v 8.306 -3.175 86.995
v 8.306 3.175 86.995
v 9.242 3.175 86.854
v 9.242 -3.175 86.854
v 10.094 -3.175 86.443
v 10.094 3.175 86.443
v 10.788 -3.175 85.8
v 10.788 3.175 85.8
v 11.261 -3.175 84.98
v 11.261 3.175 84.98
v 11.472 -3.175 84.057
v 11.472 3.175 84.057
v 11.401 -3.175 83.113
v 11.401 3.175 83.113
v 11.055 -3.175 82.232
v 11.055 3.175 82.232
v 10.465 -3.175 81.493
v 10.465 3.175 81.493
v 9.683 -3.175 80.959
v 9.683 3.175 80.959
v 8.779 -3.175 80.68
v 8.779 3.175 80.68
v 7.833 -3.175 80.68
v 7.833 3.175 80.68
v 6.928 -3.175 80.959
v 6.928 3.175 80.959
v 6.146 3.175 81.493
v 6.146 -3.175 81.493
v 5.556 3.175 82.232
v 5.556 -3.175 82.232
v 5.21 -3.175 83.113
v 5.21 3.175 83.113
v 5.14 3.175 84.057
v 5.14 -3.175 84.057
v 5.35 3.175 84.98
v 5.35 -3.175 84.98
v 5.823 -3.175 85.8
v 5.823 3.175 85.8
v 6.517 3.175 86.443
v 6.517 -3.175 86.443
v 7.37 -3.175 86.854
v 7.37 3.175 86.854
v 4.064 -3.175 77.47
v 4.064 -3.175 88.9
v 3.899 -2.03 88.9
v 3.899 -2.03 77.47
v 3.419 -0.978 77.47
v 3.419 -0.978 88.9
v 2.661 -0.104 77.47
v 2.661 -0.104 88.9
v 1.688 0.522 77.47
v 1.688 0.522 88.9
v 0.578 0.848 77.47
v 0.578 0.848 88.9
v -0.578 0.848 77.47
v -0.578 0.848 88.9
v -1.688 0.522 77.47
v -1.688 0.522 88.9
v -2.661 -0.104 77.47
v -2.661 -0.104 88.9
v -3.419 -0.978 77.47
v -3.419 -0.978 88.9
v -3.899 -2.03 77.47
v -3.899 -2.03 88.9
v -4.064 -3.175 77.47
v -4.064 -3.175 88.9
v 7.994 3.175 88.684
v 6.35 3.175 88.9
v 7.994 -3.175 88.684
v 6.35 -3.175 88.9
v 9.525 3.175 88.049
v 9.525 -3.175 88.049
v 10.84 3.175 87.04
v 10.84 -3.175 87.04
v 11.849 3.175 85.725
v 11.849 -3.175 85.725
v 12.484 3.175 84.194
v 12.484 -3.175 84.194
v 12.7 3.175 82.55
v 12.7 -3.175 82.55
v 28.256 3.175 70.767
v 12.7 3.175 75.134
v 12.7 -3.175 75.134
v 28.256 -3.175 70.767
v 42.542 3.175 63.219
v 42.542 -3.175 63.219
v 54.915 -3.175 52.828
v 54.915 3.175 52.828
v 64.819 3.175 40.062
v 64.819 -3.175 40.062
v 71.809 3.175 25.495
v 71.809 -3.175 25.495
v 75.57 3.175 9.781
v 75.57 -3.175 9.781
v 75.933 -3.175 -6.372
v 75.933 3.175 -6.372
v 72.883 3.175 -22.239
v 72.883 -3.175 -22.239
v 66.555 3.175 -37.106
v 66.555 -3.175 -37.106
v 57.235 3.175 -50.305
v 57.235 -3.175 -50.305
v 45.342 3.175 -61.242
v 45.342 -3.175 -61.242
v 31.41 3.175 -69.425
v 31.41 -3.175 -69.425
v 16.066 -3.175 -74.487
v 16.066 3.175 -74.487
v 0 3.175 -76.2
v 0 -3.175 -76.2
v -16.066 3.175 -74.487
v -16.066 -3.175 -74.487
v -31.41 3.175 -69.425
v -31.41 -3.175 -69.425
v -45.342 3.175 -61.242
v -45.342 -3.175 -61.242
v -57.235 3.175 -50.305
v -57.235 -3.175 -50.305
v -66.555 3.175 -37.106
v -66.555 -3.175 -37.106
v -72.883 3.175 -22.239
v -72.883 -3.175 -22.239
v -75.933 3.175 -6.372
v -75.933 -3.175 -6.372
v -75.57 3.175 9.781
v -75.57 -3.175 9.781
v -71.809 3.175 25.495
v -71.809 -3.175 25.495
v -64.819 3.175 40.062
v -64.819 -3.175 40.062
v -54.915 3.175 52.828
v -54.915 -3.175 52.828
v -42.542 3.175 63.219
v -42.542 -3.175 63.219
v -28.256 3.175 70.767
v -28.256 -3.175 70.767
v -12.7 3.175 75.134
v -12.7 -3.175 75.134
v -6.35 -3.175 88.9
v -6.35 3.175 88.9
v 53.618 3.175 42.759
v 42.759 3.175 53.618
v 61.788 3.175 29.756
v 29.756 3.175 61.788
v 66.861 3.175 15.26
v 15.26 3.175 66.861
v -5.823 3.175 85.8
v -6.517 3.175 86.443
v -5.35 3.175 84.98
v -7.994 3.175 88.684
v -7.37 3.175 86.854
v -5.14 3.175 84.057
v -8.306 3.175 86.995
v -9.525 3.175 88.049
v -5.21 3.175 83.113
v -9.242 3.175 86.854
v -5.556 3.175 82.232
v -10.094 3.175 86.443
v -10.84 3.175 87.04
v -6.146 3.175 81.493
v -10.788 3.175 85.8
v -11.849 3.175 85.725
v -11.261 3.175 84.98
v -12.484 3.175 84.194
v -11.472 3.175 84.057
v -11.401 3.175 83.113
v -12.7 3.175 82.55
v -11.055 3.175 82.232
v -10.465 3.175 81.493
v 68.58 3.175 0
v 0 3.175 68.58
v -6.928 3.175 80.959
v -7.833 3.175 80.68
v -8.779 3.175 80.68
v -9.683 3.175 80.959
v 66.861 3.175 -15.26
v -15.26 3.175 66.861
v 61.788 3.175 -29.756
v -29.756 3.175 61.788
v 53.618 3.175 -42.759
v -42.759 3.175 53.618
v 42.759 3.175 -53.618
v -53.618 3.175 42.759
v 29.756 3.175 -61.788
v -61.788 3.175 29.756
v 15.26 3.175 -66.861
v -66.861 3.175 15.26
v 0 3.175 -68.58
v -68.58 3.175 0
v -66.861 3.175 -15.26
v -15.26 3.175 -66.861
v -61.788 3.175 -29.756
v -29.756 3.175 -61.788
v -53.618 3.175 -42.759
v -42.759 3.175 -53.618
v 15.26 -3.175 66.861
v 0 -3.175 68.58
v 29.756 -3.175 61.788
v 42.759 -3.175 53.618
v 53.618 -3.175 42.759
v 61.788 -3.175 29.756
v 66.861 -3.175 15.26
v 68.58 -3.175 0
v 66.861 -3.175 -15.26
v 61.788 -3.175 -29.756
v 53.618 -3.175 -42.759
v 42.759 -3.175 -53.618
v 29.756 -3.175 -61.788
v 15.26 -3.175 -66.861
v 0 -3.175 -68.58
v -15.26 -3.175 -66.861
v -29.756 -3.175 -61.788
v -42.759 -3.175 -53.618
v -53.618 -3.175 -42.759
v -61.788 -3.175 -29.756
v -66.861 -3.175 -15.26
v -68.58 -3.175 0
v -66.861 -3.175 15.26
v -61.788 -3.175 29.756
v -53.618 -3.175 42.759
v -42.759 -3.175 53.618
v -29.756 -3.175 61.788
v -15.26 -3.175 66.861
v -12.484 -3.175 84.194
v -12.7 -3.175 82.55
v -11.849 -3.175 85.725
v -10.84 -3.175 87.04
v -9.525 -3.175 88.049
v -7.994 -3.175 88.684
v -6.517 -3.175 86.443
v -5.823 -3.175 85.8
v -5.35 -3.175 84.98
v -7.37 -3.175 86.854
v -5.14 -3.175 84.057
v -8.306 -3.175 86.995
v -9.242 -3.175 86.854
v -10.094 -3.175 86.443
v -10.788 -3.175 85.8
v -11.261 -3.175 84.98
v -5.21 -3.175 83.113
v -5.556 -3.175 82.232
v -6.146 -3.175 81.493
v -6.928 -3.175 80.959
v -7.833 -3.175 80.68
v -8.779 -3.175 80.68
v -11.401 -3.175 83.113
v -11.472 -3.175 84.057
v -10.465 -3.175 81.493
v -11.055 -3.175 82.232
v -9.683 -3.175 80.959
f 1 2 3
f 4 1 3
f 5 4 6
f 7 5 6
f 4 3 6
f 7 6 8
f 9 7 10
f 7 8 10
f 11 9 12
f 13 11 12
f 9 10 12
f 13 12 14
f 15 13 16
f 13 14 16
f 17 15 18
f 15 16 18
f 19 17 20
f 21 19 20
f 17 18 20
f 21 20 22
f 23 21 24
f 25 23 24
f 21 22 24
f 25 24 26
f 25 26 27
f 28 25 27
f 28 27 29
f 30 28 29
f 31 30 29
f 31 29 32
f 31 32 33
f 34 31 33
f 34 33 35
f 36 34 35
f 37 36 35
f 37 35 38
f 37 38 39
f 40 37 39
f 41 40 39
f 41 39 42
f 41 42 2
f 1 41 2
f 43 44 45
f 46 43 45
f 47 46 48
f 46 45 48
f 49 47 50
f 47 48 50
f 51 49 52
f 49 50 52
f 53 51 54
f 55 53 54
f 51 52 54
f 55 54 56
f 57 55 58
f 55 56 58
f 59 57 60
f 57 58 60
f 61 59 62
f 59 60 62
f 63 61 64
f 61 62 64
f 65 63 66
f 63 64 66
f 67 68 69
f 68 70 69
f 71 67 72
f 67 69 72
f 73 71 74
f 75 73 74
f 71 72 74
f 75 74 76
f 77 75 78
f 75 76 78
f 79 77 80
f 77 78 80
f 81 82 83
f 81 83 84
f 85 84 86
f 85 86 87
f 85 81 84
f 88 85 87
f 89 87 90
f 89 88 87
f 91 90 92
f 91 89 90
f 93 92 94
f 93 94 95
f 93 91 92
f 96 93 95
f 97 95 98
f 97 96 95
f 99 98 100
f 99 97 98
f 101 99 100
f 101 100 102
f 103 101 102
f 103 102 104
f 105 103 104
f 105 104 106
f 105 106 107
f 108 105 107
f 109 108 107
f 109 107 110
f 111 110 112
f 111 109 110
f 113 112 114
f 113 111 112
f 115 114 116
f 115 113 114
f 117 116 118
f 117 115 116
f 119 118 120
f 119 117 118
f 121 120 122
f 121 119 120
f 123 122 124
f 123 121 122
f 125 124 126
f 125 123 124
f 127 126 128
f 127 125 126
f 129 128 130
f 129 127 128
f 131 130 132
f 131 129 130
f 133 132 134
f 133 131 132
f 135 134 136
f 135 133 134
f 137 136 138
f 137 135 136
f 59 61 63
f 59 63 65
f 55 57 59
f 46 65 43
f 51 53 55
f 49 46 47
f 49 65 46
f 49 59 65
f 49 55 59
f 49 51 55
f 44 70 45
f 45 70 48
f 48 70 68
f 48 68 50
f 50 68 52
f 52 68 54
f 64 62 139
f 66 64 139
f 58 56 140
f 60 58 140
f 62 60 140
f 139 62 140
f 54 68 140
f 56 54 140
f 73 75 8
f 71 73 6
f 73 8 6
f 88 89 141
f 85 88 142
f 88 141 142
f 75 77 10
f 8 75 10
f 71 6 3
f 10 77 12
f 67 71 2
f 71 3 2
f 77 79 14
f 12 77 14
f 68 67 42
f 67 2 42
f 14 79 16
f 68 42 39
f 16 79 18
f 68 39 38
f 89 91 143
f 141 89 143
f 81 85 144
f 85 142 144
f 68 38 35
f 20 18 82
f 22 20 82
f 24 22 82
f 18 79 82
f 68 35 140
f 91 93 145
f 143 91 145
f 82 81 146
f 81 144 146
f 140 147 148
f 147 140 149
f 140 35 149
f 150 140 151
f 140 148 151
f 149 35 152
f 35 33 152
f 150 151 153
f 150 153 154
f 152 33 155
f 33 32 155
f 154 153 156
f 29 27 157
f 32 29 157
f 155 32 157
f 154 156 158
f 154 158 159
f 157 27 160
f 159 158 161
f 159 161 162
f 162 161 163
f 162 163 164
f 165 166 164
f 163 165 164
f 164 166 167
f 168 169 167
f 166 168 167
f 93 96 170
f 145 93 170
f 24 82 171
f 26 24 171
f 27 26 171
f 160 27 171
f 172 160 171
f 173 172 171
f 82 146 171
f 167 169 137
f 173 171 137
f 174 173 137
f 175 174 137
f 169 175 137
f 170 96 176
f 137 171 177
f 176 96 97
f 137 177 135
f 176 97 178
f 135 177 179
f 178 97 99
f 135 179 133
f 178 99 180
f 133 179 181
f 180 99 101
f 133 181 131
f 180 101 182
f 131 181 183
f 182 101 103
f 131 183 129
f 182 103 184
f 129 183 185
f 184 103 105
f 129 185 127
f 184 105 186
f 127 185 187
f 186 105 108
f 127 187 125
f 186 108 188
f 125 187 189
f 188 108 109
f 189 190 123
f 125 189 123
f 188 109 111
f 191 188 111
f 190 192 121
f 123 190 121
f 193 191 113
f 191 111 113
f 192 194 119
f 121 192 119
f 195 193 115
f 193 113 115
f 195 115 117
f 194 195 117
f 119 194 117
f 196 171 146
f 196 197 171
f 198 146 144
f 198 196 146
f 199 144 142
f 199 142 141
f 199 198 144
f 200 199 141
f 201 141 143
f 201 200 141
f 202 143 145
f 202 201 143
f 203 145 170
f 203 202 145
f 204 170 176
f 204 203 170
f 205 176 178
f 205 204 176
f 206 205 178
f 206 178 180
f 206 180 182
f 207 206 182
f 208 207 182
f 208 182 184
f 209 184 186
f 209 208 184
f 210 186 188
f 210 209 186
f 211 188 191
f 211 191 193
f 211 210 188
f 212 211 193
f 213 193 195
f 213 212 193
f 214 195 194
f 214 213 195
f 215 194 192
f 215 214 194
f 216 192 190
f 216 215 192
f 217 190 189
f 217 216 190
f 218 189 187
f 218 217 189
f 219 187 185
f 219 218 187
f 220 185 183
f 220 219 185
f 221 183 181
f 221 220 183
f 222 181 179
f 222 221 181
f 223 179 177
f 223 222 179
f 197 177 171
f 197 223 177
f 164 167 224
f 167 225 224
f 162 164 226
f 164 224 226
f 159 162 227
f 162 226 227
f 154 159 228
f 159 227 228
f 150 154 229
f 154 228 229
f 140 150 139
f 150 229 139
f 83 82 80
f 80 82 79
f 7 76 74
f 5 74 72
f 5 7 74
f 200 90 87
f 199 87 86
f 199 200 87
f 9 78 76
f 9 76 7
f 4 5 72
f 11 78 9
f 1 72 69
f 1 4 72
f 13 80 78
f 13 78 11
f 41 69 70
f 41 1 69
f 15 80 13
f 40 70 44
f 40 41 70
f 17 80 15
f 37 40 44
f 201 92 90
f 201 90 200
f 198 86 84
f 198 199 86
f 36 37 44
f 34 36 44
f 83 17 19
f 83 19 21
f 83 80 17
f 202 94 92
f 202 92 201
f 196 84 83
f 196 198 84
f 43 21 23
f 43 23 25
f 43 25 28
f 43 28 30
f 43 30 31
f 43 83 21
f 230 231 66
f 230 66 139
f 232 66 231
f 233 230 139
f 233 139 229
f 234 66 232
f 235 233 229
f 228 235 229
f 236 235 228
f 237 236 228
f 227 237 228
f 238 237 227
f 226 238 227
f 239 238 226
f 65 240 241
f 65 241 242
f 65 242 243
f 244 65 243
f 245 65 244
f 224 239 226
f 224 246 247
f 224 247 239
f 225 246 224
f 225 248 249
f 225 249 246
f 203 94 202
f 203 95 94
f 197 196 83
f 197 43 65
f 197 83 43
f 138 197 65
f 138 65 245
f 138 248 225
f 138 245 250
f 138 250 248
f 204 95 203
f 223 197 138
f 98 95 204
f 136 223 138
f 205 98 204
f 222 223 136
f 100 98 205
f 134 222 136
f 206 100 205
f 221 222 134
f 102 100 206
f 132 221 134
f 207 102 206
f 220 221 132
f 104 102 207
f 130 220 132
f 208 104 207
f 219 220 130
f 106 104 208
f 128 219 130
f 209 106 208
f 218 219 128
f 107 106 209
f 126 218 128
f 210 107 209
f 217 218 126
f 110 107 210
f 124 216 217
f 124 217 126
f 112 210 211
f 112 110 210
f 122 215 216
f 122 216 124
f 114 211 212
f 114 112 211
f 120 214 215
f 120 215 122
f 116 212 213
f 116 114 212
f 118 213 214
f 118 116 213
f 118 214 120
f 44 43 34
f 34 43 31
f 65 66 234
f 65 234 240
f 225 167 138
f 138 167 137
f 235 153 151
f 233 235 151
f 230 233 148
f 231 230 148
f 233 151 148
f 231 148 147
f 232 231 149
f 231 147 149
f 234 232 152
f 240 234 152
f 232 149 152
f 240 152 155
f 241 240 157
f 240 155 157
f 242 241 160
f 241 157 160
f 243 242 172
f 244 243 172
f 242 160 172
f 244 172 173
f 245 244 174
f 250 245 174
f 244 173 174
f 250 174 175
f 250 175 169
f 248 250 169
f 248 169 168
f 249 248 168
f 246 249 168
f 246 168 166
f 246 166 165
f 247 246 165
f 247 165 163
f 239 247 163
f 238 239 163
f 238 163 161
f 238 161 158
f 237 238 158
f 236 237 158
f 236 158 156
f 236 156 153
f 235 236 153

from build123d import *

# Parameters (mm, degrees)
SKETCH1_R                   = 76.2
SKETCH1_R_2                 = 68.58
BOSS_EXTRUDE1_DEPTH         = 3.175
BOSS_EXTRUDE2_DEPTH         = 6.35
FILLET1_R                   = 6.35
CUT_EXTRUDE1_DEPTH          = 11.43
F_3_8_0_25_DIAMETER_HOLE2_D = 6.35


with BuildPart() as part:
    # Sketch1 → Boss-Extrude1 (new, symmetric)
    with BuildSketch(Plane(origin=(0, 0, 0), x_dir=(1, 0, 0), z_dir=(0, 1, 0))):
        with Locations(Location((0, 0, 0), (0, 0, 270))):
            Circle(SKETCH1_R)
        with Locations(Location((0, 0, 0), (0, 0, 270))):
            Circle(SKETCH1_R_2, mode=Mode.SUBTRACT)
    extrude(amount=BOSS_EXTRUDE1_DEPTH, both=True)

    # Sketch2 → Boss-Extrude2 (add)
    with BuildSketch(Plane(origin=(0, 3.175, 0), x_dir=(1, 0, 0), z_dir=(0, 1, 0))):
        with BuildLine():
            Line((-12.7, -88.9), (-12.7, -75.134213245))
            ThreePointArc((-12.7, -75.134213245), (0, -76.2), (12.7, -75.134213245))
            Line((12.7, -75.134213245), (12.7, -88.9))
            Line((12.7, -88.9), (-12.7, -88.9))
        make_face()
    extrude(amount=-BOSS_EXTRUDE2_DEPTH)

    # Fillet1
    fillet1_edges = [part.edges().sort_by_distance(p)[0] for p in [
        (12.7, 0, 88.9),
        (-12.7, 0, 88.9),
    ]]
    fillet(fillet1_edges, radius=FILLET1_R)

    # Sketch3 → Cut-Extrude1 (cut)
    with BuildSketch(Plane.XY.offset(88.9)):
        with BuildLine():
            Line((-4.064, -3.175), (4.064, -3.175))
            ThreePointArc((4.064, -3.175), (0, 0.889), (-4.064, -3.175))
        make_face()
    extrude(amount=-CUT_EXTRUDE1_DEPTH, mode=Mode.SUBTRACT)

    # 3/8 (0.25) Diameter Hole2 (through all)
    with Locations(Plane(origin=(-8.3058, -3.175, 83.82), x_dir=(0, 0, -1), z_dir=(0, -1, 0))):
        with Locations((0, 0), (0, 16.6116)):
            Hole(F_3_8_0_25_DIAMETER_HOLE2_D / 2)


solid = part.part
